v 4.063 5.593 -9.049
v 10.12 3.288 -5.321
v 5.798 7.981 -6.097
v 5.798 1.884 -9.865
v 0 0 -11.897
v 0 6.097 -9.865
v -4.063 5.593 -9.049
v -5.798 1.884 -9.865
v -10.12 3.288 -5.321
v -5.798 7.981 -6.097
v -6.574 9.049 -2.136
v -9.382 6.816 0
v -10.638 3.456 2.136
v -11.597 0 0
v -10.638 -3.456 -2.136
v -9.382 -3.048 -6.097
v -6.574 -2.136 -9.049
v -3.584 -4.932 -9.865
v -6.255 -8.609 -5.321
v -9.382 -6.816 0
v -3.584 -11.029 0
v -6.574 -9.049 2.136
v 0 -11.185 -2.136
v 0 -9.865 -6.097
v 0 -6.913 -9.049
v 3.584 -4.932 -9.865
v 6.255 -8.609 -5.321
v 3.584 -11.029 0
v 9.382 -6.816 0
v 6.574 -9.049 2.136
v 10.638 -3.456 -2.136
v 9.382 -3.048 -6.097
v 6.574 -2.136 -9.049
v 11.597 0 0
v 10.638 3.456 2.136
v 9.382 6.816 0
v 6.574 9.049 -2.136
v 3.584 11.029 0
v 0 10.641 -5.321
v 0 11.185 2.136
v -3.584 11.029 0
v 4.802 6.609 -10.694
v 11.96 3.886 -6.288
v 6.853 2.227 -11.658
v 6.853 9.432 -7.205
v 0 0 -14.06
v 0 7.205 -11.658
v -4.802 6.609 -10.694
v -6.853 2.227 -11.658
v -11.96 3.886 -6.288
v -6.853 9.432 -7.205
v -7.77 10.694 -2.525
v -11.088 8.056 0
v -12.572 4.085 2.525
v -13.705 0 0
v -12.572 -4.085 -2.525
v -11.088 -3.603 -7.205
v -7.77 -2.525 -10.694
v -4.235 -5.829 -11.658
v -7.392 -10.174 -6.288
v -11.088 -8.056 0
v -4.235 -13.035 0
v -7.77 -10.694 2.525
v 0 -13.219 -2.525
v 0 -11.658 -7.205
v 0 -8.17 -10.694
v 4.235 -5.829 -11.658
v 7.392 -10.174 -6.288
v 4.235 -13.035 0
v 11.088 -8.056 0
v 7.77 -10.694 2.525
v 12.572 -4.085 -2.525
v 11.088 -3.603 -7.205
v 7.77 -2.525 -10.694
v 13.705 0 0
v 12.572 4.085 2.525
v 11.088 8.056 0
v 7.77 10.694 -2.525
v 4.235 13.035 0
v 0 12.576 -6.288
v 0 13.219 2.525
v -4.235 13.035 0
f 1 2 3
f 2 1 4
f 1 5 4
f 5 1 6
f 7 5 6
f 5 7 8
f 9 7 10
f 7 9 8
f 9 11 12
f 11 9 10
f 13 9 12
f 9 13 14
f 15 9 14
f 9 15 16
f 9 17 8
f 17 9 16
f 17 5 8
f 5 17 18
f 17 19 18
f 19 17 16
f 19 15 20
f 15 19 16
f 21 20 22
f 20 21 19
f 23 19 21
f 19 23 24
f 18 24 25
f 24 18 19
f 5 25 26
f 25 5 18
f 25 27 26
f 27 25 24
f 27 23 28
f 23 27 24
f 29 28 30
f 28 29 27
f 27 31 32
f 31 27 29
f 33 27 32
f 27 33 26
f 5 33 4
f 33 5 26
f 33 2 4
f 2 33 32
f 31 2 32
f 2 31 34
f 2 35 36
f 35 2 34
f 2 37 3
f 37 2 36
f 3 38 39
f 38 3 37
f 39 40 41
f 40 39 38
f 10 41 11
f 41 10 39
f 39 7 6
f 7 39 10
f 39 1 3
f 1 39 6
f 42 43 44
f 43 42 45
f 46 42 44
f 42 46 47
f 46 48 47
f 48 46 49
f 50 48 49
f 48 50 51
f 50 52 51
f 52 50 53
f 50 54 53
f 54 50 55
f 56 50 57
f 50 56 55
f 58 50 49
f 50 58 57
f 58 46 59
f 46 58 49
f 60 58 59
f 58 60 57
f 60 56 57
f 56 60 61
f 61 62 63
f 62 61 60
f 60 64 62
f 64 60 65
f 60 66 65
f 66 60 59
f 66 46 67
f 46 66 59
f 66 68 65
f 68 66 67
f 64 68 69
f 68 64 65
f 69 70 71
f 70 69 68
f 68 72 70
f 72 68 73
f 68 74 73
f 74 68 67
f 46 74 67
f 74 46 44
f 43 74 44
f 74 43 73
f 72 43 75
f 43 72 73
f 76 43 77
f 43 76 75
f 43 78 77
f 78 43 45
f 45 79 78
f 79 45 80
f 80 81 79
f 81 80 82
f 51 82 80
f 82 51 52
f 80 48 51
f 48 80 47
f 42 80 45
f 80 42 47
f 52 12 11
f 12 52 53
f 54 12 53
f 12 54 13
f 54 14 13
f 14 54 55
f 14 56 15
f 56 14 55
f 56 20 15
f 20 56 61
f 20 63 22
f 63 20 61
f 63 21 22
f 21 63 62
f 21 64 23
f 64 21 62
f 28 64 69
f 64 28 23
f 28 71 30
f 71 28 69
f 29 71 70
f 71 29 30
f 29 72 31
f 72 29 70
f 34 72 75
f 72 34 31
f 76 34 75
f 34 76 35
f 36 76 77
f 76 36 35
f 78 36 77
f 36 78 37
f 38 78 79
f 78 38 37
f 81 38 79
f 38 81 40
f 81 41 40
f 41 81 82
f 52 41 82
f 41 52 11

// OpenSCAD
module eggshell() {

	rotate ([0,0,18])
		polyhedron( points = [ [5.592530e+00, 4.063211e+00, -9.048904e+00], [7.980826e+00, 5.798409e+00, -6.096808e+00], [1.064110e+01, -0.000000e+00, -5.320550e+00], [6.096808e+00, 0.000000e+00, -9.864843e+00], [-8.881784e-16, 0.000000e+00, -1.189711e+01], [1.884017e+00, 5.798409e+00, -9.864843e+00], [-2.136156e+00, 6.574413e+00, -9.048904e+00], [-4.932421e+00, 3.583614e+00, -9.864843e+00], [-8.608831e+00, 6.254682e+00, -5.320550e+00], [-3.048404e+00, 9.382023e+00, -6.096808e+00], [-3.456374e+00, 1.063762e+01, -2.136156e+00], [-6.816439e+00, 9.382023e+00, -0.000000e+00], [-9.048904e+00, 6.574413e+00, 2.136156e+00], [-1.102923e+01, 3.583614e+00, 8.881784e-16], [-1.118506e+01, 0.000000e+00, -2.136156e+00], [-9.864843e+00, 0.000000e+00, -6.096808e+00], [-6.912747e+00, 0.000000e+00, -9.048904e+00], [-4.932421e+00, -3.583614e+00, -9.864843e+00], [-8.608831e+00, -6.254682e+00, -5.320550e+00], [-1.102923e+01, -3.583614e+00, 8.881784e-16], [-9.048904e+00, -6.574413e+00, 2.136156e+00], [-6.816439e+00, -9.382023e+00, -0.000000e+00], [-3.456374e+00, -1.063762e+01, -2.136156e+00], [-3.048404e+00, -9.382023e+00, -6.096808e+00], [-2.136156e+00, -6.574413e+00, -9.048904e+00], [1.884017e+00, -5.798409e+00, -9.864843e+00], [3.288281e+00, -1.012029e+01, -5.320550e+00], [0.000000e+00, -1.159682e+01, -0.000000e+00], [3.456374e+00, -1.063762e+01, 2.136156e+00], [6.816439e+00, -9.382023e+00, -0.000000e+00], [9.048904e+00, -6.574413e+00, -2.136156e+00], [7.980826e+00, -5.798409e+00, -6.096808e+00], [5.592530e+00, -4.063211e+00, -9.048904e+00], [1.102923e+01, -3.583614e+00, -8.881784e-16], [1.118506e+01, -0.000000e+00, 2.136156e+00], [1.102923e+01, 3.583614e+00, -8.881784e-16], [9.048904e+00, 6.574413e+00, -2.136156e+00], [3.288281e+00, 1.012029e+01, -5.320550e+00], [6.816439e+00, 9.382023e+00, -0.000000e+00], [3.456374e+00, 1.063762e+01, 2.136156e+00], [-0.000000e+00, 1.159682e+01, -0.000000e+00], [6.609354e+00, 4.801977e+00, -1.069416e+01], [9.431885e+00, 6.852665e+00, -7.205319e+00], [1.257585e+01, -0.000000e+00, -6.287923e+00], [7.205319e+00, 0.000000e+00, -1.165845e+01], [-8.881784e-16, 0.000000e+00, -1.406022e+01], [2.226566e+00, 6.852665e+00, -1.165845e+01], [-2.524549e+00, 7.769761e+00, -1.069416e+01], [-5.829225e+00, 4.235180e+00, -1.165845e+01], [-1.017407e+01, 7.391897e+00, -6.287923e+00], [-3.602659e+00, 1.108785e+01, -7.205319e+00], [-4.084805e+00, 1.257174e+01, -2.524549e+00], [-8.055791e+00, 1.108785e+01, 4.440892e-16], [-1.069416e+01, 7.769761e+00, 2.524549e+00], [-1.303454e+01, 4.235180e+00, 8.881784e-16], [-1.321871e+01, 0.000000e+00, -2.524549e+00], [-1.165845e+01, 0.000000e+00, -7.205319e+00], [-8.169611e+00, 0.000000e+00, -1.069416e+01], [-5.829225e+00, -4.235180e+00, -1.165845e+01], [-1.017407e+01, -7.391897e+00, -6.287923e+00], [-1.303454e+01, -4.235180e+00, 8.881784e-16], [-1.069416e+01, -7.769761e+00, 2.524549e+00], [-8.055791e+00, -1.108785e+01, 4.440892e-16], [-4.084805e+00, -1.257174e+01, -2.524549e+00], [-3.602659e+00, -1.108785e+01, -7.205319e+00], [-2.524549e+00, -7.769761e+00, -1.069416e+01], [2.226566e+00, -6.852665e+00, -1.165845e+01], [3.886150e+00, -1.196034e+01, -6.287923e+00], [0.000000e+00, -1.370533e+01, -0.000000e+00], [4.084805e+00, -1.257174e+01, 2.524549e+00], [8.055791e+00, -1.108785e+01, -4.440892e-16], [1.069416e+01, -7.769761e+00, -2.524549e+00], [9.431885e+00, -6.852665e+00, -7.205319e+00], [6.609354e+00, -4.801977e+00, -1.069416e+01], [1.303454e+01, -4.235180e+00, -8.881784e-16], [1.321871e+01, -0.000000e+00, 2.524549e+00], [1.303454e+01, 4.235180e+00, -8.881784e-16], [1.069416e+01, 7.769761e+00, -2.524549e+00], [3.886150e+00, 1.196034e+01, -6.287923e+00], [8.055791e+00, 1.108785e+01, -4.440892e-16], [4.084805e+00, 1.257174e+01, 2.524549e+00], [-0.000000e+00, 1.370533e+01, -0.000000e+00] ], faces = [ [ 1, 2, 3, 0 ] , [ 3, 4, 5, 0 ] , [ 5, 4, 7, 6 ] , [ 7, 8, 9, 6 ] , [ 9, 8, 11, 10 ] , [ 11, 8, 13, 12 ] , [ 13, 8, 15, 14 ] , [ 15, 8, 7, 16 ] , [ 7, 4, 17, 16 ] , [ 17, 18, 15, 16 ] , [ 15, 18, 19, 14 ] , [ 19, 18, 21, 20 ] , [ 21, 18, 23, 22 ] , [ 23, 18, 17, 24 ] , [ 17, 4, 25, 24 ] , [ 25, 26, 23, 24 ] , [ 23, 26, 27, 22 ] , [ 27, 26, 29, 28 ] , [ 29, 26, 31, 30 ] , [ 31, 26, 25, 32 ] , [ 25, 4, 3, 32 ] , [ 3, 2, 31, 32 ] , [ 31, 2, 33, 30 ] , [ 33, 2, 35, 34 ] , [ 35, 2, 1, 36 ] , [ 1, 37, 38, 36 ] , [ 38, 37, 40, 39 ] , [ 40, 37, 9, 10 ] , [ 9, 37, 5, 6 ] , [ 5, 37, 1, 0 ] , [ 44, 43, 42, 41 ] , [ 46, 45, 44, 41 ] , [ 48, 45, 46, 47 ] , [ 50, 49, 48, 47 ] , [ 52, 49, 50, 51 ] , [ 54, 49, 52, 53 ] , [ 56, 49, 54, 55 ] , [ 48, 49, 56, 57 ] , [ 58, 45, 48, 57 ] , [ 56, 59, 58, 57 ] , [ 60, 59, 56, 55 ] , [ 62, 59, 60, 61 ] , [ 64, 59, 62, 63 ] , [ 58, 59, 64, 65 ] , [ 66, 45, 58, 65 ] , [ 64, 67, 66, 65 ] , [ 68, 67, 64, 63 ] , [ 70, 67, 68, 69 ] , [ 72, 67, 70, 71 ] , [ 66, 67, 72, 73 ] , [ 44, 45, 66, 73 ] , [ 72, 43, 44, 73 ] , [ 74, 43, 72, 71 ] , [ 76, 43, 74, 75 ] , [ 42, 43, 76, 77 ] , [ 79, 78, 42, 77 ] , [ 81, 78, 79, 80 ] , [ 50, 78, 81, 51 ] , [ 46, 78, 50, 47 ] , [ 42, 78, 46, 41 ] , [ 52, 51, 10, 11 ] , [ 53, 52, 11, 12 ] , [ 54, 53, 12, 13 ] , [ 55, 54, 13, 14 ] , [ 60, 55, 14, 19 ] , [ 61, 60, 19, 20 ] , [ 62, 61, 20, 21 ] , [ 63, 62, 21, 22 ] , [ 68, 63, 22, 27 ] , [ 69, 68, 27, 28 ] , [ 70, 69, 28, 29 ] , [ 71, 70, 29, 30 ] , [ 74, 71, 30, 33 ] , [ 75, 74, 33, 34 ] , [ 76, 75, 34, 35 ] , [ 77, 76, 35, 36 ] , [ 79, 77, 36, 38 ] , [ 80, 79, 38, 39 ] , [ 81, 80, 39, 40 ] , [ 51, 81, 40, 10 ]  ], convexity = 10);

}

eggshell();
